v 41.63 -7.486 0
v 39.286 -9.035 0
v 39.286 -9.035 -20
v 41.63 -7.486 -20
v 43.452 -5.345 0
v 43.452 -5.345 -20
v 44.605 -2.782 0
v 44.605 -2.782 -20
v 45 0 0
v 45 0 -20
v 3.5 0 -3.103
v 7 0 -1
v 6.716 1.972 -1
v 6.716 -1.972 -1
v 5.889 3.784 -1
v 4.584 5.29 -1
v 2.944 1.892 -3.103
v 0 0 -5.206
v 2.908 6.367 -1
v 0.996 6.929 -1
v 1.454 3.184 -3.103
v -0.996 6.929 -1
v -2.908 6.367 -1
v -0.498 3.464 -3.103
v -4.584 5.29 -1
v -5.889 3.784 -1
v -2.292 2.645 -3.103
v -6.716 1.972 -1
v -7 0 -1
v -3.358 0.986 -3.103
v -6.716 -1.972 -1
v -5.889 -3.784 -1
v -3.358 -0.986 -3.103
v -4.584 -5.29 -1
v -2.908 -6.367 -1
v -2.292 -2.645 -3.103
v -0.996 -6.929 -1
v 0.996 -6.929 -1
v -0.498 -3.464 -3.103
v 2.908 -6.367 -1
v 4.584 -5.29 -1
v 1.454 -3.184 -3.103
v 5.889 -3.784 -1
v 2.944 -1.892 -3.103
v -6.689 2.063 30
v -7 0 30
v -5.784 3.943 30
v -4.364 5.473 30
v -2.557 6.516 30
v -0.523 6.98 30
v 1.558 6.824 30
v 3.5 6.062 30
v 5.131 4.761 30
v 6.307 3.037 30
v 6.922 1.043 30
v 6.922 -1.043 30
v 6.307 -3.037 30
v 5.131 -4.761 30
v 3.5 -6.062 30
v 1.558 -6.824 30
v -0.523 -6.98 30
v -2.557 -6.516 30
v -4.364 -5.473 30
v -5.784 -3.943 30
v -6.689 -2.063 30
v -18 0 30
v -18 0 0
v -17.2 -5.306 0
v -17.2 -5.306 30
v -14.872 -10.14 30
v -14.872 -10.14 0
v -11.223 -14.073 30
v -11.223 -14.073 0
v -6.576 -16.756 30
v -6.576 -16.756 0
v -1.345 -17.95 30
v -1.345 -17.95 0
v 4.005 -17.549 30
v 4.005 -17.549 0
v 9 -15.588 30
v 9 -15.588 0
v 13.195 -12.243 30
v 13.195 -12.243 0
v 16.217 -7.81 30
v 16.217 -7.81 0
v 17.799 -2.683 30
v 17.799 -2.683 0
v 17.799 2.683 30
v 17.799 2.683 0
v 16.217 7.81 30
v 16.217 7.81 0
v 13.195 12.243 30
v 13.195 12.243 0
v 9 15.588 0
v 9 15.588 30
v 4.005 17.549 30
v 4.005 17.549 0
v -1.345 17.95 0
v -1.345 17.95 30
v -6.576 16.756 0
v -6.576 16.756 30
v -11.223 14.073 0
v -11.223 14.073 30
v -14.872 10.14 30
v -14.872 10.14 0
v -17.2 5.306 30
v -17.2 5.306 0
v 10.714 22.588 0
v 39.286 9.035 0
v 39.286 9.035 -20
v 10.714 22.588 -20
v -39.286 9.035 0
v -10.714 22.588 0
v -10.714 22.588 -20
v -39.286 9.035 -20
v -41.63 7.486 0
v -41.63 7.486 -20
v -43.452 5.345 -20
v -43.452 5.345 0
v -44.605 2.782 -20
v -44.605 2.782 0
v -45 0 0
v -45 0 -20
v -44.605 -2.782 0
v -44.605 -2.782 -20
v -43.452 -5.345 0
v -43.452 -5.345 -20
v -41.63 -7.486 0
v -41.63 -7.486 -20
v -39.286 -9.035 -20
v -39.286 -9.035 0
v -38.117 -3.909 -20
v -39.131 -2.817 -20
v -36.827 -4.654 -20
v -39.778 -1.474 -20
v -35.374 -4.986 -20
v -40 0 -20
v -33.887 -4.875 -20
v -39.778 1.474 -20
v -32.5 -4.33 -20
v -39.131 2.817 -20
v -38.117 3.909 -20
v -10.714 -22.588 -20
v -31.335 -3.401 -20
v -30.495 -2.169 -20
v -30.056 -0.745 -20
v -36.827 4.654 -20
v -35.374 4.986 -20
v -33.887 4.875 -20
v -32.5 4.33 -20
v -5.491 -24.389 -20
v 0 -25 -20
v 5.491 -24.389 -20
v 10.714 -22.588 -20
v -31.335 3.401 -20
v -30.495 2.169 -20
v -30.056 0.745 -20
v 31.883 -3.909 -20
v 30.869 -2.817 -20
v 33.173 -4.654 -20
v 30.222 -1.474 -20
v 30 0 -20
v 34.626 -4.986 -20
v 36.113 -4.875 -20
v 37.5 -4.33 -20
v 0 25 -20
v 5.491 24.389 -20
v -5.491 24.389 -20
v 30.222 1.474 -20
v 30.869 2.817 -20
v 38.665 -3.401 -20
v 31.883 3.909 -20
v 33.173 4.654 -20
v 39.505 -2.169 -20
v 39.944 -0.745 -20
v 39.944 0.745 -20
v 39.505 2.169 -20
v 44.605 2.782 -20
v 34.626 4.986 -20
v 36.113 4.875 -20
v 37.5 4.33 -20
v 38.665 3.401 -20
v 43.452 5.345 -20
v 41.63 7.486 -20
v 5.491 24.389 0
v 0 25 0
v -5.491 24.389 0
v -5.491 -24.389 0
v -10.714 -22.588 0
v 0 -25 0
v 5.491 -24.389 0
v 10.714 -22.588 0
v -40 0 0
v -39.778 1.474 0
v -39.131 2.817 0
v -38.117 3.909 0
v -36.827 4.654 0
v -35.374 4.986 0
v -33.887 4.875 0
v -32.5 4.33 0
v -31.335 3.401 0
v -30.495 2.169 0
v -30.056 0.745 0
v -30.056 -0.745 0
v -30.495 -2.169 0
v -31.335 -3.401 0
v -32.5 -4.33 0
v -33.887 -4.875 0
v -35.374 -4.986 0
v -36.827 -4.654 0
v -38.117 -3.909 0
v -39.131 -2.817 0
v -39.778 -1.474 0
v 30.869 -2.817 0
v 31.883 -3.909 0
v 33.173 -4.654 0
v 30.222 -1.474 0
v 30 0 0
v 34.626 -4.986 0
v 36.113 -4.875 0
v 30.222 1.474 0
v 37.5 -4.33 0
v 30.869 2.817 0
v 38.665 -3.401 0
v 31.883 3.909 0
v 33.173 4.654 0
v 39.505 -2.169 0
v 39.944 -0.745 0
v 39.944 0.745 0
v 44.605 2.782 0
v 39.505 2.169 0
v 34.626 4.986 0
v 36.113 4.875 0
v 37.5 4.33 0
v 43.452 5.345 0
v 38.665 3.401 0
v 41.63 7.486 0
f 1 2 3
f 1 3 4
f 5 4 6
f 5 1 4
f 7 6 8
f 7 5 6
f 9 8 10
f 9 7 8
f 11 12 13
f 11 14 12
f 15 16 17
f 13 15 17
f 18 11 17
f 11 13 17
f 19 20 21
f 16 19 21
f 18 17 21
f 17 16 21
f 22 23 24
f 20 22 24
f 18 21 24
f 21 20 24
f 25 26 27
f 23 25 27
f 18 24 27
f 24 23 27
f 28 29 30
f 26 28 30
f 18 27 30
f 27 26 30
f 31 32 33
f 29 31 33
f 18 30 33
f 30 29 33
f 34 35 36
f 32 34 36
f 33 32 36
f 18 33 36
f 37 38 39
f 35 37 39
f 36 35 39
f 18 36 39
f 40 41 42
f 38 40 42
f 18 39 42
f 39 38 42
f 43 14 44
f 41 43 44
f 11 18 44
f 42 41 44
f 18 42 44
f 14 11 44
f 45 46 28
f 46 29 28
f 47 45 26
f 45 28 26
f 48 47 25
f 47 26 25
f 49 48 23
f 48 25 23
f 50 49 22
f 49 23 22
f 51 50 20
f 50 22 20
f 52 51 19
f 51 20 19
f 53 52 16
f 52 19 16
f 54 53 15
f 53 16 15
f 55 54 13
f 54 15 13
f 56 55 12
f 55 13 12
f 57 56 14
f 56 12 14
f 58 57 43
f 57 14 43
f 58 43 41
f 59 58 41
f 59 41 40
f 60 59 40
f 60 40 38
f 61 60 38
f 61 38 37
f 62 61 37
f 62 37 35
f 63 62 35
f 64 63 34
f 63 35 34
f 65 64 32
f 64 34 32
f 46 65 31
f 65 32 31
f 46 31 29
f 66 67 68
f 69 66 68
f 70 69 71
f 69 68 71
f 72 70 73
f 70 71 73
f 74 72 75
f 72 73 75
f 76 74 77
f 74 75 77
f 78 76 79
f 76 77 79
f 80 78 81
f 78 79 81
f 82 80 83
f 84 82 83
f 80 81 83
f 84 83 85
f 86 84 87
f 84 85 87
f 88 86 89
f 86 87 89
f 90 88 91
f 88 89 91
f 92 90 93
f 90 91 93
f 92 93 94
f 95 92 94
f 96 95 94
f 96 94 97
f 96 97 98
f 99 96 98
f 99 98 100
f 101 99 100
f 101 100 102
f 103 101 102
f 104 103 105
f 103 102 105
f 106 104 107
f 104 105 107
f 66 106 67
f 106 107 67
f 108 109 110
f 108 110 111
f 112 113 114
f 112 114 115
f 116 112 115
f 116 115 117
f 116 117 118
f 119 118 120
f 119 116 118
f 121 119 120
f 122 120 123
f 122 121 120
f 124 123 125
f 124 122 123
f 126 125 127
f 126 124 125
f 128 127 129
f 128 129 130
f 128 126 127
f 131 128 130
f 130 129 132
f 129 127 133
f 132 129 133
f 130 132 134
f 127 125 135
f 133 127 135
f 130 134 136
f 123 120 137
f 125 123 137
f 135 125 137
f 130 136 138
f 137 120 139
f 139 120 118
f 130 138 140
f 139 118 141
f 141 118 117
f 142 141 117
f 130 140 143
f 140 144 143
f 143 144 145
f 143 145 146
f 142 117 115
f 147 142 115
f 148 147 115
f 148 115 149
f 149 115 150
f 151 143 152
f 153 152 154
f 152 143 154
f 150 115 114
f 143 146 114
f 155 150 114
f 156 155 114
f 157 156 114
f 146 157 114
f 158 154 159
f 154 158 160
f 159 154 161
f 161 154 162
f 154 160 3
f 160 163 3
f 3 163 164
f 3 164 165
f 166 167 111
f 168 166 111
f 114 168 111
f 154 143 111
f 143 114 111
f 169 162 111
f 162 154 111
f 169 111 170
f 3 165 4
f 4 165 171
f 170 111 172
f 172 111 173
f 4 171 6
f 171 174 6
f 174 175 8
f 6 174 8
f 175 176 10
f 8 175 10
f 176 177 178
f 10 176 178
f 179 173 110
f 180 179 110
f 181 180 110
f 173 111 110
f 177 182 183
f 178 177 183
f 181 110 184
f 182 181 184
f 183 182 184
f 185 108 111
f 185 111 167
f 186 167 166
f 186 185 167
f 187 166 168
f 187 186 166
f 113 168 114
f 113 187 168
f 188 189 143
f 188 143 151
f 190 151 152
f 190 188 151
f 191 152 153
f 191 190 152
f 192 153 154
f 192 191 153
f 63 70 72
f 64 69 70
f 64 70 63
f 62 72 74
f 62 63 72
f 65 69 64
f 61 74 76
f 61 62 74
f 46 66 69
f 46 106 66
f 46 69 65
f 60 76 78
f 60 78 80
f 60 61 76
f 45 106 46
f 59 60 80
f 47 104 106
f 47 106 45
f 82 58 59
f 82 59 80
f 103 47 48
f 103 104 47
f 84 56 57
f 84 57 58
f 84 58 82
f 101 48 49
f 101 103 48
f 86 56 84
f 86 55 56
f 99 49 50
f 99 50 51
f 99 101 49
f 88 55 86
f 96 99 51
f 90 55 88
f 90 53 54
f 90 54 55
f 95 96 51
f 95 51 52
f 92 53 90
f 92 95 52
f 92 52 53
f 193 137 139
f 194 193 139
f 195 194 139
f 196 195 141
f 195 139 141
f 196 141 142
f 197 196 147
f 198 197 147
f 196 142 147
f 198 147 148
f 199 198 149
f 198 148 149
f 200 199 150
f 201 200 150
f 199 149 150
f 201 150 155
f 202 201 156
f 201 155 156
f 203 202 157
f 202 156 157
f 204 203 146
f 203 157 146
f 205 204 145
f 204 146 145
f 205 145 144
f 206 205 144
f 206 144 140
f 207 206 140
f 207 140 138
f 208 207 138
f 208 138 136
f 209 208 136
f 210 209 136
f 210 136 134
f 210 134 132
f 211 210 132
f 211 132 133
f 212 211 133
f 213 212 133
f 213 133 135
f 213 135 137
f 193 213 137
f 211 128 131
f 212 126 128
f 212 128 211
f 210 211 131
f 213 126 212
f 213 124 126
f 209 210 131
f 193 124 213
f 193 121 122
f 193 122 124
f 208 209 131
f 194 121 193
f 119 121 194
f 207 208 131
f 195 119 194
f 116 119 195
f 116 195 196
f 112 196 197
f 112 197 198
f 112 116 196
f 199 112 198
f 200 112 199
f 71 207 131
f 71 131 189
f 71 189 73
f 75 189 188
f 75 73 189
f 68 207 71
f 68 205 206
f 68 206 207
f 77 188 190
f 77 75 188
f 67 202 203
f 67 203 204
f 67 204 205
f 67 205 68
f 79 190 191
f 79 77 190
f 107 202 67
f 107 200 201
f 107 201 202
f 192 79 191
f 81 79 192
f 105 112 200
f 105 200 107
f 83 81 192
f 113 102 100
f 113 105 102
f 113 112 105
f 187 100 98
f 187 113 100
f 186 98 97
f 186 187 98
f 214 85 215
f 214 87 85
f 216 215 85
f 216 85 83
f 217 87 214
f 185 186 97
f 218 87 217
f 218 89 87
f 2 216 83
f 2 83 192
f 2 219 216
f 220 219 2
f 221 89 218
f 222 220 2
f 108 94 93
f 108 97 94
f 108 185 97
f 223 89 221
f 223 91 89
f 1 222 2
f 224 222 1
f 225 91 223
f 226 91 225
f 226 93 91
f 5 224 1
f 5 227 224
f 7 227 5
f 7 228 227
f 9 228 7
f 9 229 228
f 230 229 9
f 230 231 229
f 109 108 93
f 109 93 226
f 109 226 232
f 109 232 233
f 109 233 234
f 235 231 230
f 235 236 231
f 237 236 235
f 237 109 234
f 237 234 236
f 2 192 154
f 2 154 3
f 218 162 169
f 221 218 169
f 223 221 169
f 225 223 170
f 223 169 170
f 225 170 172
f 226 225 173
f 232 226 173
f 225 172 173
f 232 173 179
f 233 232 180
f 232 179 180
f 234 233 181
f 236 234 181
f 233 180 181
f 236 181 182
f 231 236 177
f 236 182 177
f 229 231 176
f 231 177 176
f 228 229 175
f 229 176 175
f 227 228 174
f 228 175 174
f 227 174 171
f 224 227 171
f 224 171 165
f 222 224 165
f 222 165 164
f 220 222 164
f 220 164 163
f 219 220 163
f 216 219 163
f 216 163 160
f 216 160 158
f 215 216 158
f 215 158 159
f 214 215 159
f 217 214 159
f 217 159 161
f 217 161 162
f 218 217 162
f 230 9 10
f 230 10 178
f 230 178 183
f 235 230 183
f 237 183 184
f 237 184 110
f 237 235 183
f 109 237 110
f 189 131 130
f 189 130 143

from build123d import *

# Parameters (mm, degrees)
F1_DEPTH = 20
F2_DEPTH = 30
F3_D     = 10
F5_D     = 14
F5_DEPTH = 31
F5_TIP   = 4.2060243332


with BuildPart() as f1:
    # F0 (on Top) → F1 (new body)
    with BuildSketch(Plane.XY):
        with BuildLine():
            Line((-39.2857142857, -9.0350790291), (-10.7142857143, -22.5876975726))
            ThreePointArc((-10.7142857143, -22.5876975726), (-21.1288563682, -13.3630620956), (-25, 0))
            ThreePointArc((-25, 0), (-29.6547751618, -8.4515425473), (-39.2857142857, -9.0350790291))
        make_face()
        with BuildLine():
            ThreePointArc((-39.2857142857, -9.0350790291), (-29.6547751618, -8.4515425473), (-25, 0))
            ThreePointArc((-25, 0), (-29.6547751618, 8.4515425473), (-39.2857142857, 9.0350790291))
            ThreePointArc((-39.2857142857, 9.0350790291), (-45, 0), (-39.2857142857, -9.0350790291))
        make_face()
        with BuildLine():
            Line((0, 0), (18, 0))
            ThreePointArc((18, 0), (0, 18), (-18, 0))
            Line((-18, 0), (0, 0))
        make_face()
        with BuildLine():
            ThreePointArc((-18, 0), (0, -18), (18, 0))
            Line((18, 0), (0, 0))
            Line((0, 0), (-18, 0))
        make_face()
        with BuildLine():
            ThreePointArc((10.7142857143, -22.5876975726), (21.1288563682, -13.3630620956), (25, 0))
            Line((25, 0), (18, 0))
            ThreePointArc((18, 0), (0, -18), (-18, 0))
            Line((-18, 0), (-25, 0))
            ThreePointArc((-25, 0), (-21.1288563682, -13.3630620956), (-10.7142857143, -22.5876975726))
            ThreePointArc((-10.7142857143, -22.5876975726), (0, -25), (10.7142857143, -22.5876975726))
        make_face()
        with BuildLine():
            ThreePointArc((39.2857142857, -9.0350790291), (29.6547751618, -8.4515425473), (25, 0))
            ThreePointArc((25, 0), (21.1288563682, -13.3630620956), (10.7142857143, -22.5876975726))
            Line((10.7142857143, -22.5876975726), (39.2857142857, -9.0350790291))
        make_face()
        with BuildLine():
            ThreePointArc((39.2857142857, 9.0350790291), (29.6547751618, 8.4515425473), (25, 0))
            ThreePointArc((25, 0), (29.6547751618, -8.4515425473), (39.2857142857, -9.0350790291))
            ThreePointArc((39.2857142857, -9.0350790291), (43.4515425473, -5.3452248382), (45, 0))
            ThreePointArc((45, 0), (43.4515425473, 5.3452248382), (39.2857142857, 9.0350790291))
        make_face()
        with BuildLine():
            ThreePointArc((10.7142857143, 22.5876975726), (21.1288563682, 13.3630620956), (25, 0))
            ThreePointArc((25, 0), (29.6547751618, 8.4515425473), (39.2857142857, 9.0350790291))
            Line((39.2857142857, 9.0350790291), (10.7142857143, 22.5876975726))
        make_face()
        with BuildLine():
            ThreePointArc((-25, 0), (-21.1288563682, 13.3630620956), (-10.7142857143, 22.5876975726))
            Line((-10.7142857143, 22.5876975726), (-39.2857142857, 9.0350790291))
            ThreePointArc((-39.2857142857, 9.0350790291), (-29.6547751618, 8.4515425473), (-25, 0))
        make_face()
        with BuildLine():
            Line((18, 0), (25, 0))
            ThreePointArc((25, 0), (21.1288563682, 13.3630620956), (10.7142857143, 22.5876975726))
            ThreePointArc((10.7142857143, 22.5876975726), (0, 25), (-10.7142857143, 22.5876975726))
            ThreePointArc((-10.7142857143, 22.5876975726), (-21.1288563682, 13.3630620956), (-25, 0))
            Line((-25, 0), (-18, 0))
            ThreePointArc((-18, 0), (0, 18), (18, 0))
        make_face()
    extrude(amount=-F1_DEPTH)

    # F0 (on Top) → F2 (join)
    with BuildSketch(Plane.XY):
        with BuildLine():
            Line((0, 0), (18, 0))
            ThreePointArc((18, 0), (0, 18), (-18, 0))
            Line((-18, 0), (0, 0))
        make_face()
        with BuildLine():
            ThreePointArc((-18, 0), (0, -18), (18, 0))
            Line((18, 0), (0, 0))
            Line((0, 0), (-18, 0))
        make_face()
    extrude(amount=F2_DEPTH)

    # F3 (through all)
    with Locations(Plane.XY):
        with Locations((-35, 0), (35, 0)):
            Hole(F3_D / 2)

    # F5
    with Locations(Plane.XY.offset(30)):
        with Locations((0, 0)):
            Hole(F5_D / 2, depth=F5_DEPTH)
            with Locations((0, 0, -(F5_DEPTH + F5_TIP / 2))):  # 118° drill point
                Cone(0, F5_D / 2, F5_TIP, mode=Mode.SUBTRACT)


solid = f1.part
